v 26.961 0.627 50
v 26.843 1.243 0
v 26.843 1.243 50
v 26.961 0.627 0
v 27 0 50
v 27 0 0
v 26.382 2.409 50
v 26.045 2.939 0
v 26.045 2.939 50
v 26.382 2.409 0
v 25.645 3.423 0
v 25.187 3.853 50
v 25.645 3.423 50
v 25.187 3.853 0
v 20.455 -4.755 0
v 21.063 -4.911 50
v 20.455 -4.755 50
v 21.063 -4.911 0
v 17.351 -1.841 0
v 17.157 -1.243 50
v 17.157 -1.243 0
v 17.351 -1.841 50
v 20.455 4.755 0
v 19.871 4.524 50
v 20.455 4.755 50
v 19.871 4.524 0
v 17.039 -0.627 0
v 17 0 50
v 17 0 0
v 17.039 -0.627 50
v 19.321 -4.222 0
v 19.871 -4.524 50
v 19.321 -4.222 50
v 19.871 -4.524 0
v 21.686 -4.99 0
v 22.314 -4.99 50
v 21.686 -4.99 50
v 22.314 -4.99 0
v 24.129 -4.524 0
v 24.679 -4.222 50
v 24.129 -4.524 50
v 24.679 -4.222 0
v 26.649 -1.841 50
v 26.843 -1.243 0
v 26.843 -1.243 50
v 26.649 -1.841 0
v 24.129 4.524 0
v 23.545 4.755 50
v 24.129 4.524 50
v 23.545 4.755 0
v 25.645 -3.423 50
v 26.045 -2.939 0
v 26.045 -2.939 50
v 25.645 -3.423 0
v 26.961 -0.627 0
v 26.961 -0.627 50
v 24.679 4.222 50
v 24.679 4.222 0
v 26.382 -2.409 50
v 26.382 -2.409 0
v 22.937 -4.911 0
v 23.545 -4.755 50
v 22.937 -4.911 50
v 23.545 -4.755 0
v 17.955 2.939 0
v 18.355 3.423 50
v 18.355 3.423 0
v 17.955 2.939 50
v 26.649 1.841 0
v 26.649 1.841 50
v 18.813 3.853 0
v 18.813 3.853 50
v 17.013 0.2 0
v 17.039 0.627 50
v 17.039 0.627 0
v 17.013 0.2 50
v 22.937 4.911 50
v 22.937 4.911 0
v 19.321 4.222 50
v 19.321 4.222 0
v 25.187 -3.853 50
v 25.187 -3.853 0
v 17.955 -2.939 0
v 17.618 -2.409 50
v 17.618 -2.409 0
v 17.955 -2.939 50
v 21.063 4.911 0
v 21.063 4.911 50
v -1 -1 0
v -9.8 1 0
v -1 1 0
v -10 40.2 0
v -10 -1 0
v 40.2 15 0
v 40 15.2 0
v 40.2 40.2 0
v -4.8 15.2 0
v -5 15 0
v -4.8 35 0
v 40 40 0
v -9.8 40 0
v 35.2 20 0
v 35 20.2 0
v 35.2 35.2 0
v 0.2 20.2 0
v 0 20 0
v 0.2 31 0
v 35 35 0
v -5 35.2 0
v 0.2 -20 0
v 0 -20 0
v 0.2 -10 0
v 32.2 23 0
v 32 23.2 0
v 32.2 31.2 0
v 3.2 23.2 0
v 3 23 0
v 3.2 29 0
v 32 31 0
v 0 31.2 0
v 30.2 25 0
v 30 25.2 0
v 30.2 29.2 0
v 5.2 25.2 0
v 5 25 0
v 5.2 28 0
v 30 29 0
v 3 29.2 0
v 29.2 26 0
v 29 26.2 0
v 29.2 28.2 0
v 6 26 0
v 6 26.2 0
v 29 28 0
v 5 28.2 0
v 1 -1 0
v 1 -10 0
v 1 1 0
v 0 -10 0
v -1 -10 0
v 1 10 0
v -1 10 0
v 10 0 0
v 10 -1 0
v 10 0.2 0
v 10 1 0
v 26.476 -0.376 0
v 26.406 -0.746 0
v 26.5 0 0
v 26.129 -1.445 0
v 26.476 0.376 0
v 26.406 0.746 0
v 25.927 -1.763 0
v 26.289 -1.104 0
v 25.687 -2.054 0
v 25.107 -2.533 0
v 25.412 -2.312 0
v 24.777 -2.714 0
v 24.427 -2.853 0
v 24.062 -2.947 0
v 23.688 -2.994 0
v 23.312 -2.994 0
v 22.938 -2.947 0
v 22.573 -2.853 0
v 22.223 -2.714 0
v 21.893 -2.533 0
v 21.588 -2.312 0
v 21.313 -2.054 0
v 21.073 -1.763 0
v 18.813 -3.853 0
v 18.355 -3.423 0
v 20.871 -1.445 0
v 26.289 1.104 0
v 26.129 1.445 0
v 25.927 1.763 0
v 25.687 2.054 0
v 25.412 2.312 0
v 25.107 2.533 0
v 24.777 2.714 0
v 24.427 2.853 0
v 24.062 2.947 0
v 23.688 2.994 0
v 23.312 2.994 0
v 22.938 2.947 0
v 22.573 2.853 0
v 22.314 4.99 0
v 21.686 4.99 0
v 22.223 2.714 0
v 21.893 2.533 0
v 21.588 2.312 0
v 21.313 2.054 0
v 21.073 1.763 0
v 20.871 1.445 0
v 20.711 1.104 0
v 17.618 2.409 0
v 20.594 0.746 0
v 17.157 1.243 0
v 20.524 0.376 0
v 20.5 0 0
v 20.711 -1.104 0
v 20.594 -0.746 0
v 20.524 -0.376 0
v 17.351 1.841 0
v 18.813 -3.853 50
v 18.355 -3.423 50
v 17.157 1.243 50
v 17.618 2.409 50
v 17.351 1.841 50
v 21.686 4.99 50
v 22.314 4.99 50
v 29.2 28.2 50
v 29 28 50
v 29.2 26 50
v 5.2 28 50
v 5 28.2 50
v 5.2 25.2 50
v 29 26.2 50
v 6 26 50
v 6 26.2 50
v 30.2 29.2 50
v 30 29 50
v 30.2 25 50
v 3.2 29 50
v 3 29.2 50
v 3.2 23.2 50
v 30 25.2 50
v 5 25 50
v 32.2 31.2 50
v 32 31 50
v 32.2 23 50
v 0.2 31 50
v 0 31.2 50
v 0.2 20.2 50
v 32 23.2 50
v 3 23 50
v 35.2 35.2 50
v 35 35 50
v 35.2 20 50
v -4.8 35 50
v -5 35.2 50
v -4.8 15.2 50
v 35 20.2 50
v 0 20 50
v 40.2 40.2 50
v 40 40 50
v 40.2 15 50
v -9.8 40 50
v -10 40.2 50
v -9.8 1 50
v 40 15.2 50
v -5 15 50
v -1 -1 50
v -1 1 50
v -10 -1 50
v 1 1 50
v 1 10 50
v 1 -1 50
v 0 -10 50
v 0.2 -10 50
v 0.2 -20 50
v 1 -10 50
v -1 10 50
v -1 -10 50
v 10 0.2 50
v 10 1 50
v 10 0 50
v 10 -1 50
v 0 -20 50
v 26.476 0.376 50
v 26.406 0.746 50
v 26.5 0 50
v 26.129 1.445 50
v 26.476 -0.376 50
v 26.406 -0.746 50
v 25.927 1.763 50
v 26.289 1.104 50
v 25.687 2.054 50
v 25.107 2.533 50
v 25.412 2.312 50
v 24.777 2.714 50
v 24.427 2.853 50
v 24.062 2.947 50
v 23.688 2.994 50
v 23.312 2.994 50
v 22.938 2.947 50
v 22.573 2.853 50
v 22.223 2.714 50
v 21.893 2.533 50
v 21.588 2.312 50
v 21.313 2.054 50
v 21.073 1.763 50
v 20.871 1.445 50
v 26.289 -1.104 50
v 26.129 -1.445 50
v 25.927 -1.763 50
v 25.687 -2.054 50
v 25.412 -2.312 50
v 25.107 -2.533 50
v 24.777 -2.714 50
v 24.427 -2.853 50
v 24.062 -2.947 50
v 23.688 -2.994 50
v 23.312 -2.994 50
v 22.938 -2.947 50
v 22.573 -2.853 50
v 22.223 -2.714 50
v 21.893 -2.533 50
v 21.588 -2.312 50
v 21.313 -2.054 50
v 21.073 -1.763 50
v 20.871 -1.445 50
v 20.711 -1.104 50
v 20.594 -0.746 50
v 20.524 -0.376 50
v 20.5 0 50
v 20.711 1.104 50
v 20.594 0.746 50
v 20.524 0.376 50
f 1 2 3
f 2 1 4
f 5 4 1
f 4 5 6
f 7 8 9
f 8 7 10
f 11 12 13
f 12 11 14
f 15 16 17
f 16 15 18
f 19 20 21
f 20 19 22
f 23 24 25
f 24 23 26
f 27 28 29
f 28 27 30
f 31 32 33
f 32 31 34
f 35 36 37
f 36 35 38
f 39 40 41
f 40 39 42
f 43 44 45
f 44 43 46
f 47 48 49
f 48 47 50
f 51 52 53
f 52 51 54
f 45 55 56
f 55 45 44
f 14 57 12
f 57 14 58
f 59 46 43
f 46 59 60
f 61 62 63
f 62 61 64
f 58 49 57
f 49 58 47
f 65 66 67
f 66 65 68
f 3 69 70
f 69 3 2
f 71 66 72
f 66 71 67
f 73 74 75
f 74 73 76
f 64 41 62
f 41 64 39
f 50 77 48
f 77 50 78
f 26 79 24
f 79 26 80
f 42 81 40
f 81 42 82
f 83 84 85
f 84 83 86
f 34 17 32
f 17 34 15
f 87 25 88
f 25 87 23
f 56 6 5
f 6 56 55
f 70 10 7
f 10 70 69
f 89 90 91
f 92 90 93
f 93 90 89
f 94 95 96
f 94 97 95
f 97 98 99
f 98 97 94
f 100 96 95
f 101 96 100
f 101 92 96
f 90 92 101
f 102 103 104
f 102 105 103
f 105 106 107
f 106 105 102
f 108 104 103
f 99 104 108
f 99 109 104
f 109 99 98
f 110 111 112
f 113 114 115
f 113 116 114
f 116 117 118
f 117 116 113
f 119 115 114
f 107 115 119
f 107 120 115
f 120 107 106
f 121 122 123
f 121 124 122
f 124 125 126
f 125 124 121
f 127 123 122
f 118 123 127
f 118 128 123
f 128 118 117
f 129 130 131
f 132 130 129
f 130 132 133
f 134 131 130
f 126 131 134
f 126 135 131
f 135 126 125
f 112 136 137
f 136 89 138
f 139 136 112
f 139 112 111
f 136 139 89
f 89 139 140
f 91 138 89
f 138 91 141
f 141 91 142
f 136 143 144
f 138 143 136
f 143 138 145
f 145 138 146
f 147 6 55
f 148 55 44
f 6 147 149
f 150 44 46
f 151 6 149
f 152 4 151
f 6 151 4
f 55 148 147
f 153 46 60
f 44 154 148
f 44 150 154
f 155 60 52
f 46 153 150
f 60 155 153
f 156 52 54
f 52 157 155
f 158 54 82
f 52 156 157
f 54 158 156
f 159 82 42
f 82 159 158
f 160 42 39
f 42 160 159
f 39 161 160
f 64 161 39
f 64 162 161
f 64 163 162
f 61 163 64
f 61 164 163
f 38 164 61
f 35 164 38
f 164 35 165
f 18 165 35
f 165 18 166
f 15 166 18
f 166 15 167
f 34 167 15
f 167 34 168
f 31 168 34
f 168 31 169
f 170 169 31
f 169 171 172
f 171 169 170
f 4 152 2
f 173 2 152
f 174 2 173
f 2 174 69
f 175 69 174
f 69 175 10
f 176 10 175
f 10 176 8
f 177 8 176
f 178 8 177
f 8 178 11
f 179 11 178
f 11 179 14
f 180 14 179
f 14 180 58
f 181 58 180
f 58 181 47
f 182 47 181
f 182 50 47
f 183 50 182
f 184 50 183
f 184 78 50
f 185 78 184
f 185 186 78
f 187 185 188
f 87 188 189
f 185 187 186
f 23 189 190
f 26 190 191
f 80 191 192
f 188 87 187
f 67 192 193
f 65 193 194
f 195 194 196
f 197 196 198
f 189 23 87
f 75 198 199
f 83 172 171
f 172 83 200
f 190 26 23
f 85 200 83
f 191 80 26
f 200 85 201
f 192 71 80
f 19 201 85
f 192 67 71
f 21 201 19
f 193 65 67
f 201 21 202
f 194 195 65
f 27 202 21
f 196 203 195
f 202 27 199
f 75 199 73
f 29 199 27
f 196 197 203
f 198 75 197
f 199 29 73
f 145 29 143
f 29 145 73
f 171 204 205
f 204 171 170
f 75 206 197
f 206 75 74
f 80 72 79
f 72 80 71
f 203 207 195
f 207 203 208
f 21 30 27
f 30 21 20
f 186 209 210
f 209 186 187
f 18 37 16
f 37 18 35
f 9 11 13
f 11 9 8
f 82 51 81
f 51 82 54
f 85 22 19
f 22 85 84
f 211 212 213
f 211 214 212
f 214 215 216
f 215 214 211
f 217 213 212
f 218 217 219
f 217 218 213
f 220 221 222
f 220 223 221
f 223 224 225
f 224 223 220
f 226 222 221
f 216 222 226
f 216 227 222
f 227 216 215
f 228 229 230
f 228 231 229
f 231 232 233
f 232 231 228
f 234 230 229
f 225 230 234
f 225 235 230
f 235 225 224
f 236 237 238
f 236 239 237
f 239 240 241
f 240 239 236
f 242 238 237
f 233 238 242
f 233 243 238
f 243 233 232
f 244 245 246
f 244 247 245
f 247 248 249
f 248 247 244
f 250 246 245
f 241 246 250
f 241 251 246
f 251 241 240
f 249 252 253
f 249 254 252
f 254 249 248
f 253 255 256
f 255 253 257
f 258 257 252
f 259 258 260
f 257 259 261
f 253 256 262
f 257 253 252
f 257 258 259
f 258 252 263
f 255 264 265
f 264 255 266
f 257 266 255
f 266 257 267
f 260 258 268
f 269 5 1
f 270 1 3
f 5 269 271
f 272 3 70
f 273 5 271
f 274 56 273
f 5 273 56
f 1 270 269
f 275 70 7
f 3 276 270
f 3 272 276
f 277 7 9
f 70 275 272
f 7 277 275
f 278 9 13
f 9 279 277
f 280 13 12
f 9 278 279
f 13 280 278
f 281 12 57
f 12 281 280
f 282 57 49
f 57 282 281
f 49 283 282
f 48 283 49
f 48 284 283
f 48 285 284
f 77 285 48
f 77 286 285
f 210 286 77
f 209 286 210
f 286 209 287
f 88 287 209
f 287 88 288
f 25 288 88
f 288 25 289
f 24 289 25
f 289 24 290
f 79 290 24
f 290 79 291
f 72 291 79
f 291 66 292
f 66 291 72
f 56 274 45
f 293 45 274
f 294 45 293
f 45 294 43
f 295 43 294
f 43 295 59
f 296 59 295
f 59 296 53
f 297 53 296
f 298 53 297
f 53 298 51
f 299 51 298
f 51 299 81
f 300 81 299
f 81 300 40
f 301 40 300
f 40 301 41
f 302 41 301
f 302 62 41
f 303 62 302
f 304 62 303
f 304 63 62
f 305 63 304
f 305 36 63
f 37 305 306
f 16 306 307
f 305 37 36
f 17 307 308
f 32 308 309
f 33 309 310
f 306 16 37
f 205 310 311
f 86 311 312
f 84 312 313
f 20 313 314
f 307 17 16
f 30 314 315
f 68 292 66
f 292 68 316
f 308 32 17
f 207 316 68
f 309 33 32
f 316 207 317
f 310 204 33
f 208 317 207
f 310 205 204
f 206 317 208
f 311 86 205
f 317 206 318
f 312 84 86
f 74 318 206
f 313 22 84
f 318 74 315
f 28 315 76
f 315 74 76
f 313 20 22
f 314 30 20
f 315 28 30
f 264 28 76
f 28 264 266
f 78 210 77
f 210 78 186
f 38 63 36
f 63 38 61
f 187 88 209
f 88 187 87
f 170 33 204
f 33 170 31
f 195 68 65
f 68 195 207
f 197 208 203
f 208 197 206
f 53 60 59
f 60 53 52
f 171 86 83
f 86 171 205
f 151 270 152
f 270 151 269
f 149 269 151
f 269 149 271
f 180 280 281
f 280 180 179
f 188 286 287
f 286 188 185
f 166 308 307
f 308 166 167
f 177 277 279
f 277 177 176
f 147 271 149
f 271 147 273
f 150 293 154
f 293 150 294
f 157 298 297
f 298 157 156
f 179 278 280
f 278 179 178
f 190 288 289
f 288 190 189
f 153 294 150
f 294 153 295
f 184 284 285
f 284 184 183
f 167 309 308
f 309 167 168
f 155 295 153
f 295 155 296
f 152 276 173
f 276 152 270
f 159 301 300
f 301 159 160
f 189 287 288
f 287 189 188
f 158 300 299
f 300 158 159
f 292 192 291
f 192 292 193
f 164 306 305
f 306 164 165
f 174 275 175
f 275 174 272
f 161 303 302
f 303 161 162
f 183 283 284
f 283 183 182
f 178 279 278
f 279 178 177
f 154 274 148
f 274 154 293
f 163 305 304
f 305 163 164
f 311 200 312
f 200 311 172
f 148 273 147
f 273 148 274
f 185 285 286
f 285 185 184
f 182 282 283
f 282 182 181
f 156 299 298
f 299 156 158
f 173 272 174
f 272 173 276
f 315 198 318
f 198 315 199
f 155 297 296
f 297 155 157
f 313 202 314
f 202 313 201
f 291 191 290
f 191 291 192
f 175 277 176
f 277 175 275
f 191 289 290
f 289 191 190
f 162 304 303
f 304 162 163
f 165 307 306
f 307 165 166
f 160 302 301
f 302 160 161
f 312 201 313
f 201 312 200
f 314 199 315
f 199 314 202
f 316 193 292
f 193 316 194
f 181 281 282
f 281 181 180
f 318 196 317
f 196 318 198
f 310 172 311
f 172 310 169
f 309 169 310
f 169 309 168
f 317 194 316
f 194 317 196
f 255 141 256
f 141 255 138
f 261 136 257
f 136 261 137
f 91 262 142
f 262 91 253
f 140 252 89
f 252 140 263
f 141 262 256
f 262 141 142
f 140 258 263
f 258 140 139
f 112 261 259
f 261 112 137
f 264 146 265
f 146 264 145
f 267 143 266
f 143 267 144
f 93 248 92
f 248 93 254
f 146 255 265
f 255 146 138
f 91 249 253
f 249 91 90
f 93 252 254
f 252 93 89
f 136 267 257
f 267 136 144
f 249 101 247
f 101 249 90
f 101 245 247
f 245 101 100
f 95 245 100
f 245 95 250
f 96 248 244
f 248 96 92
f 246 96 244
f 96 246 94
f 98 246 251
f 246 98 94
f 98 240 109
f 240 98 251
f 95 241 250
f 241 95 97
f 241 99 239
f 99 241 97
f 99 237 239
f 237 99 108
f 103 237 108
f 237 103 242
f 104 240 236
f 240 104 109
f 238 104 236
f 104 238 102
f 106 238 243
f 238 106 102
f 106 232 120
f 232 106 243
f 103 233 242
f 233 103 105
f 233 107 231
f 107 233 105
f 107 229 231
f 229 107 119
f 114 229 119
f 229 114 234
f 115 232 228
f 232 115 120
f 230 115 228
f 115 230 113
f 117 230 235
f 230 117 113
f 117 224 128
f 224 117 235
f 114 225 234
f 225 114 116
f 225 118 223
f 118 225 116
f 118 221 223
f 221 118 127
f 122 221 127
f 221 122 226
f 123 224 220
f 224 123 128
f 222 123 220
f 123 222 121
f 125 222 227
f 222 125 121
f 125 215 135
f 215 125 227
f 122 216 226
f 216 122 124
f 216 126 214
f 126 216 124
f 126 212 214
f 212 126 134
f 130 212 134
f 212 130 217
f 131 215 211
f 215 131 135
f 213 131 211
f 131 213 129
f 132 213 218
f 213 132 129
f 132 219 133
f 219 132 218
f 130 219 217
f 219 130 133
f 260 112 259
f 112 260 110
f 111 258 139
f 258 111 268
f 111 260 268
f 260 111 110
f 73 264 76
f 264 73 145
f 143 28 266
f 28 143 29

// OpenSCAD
union() {

//central cube
translate([-1,-10,0]) cube([2,20,50]);
translate([-10,-1,0]) cube([20,2,50]);

// maze
translate([-10,0,0]) cube([0.2, 40, 50]);
translate([-10,40,0]) cube([50, 0.2, 50]);
translate([40,15,0]) cube([0.2, 25.2, 50]);
translate([-5,15,0]) cube([45, 0.2, 50]);
translate([-5,15,0]) cube([0.2, 20, 50]);
translate([-5,35,0]) cube([40, 0.2, 50]);
translate([35,20,0]) cube([0.2, 15.2, 50]);
translate([0,20,0]) cube([35, 0.2, 50]);

// 3
translate([0,20,0]) cube([0.2, 11,  50]);
translate([0,31,0]) cube([32, 0.2,  50]);
translate([32,23,0]) cube([0.2, 8.2,  50]);
translate([3,23,0]) cube([29, 0.2,  50]);

// 2
translate([3,23,0]) cube([0.2, 6,  50]);
translate([3,29,0]) cube([27, 0.2,  50]);
translate([30,25,0]) cube([0.2, 4.2,  50]);
translate([5,25,0]) cube([25, 0.2,  50]);

// 1
translate([5,25,0]) cube([0.2, 3,  50]);
translate([5,28,0]) cube([24, 0.2,  50]);
translate([29,26,0]) cube([0.2, 2.2, 50]);
translate([6,26,0]) cube([23, 0.2, 50]);

translate([0,-20,0]) cube([0.2, 10, 50]);
//translate([0,-39,0]) rotate(a=[0,0,90.5]) spiral();

translate([10,0,0]) cube([10, 0.2, 50]);

// cylinder
difference() {
	translate([22, 0, 0]) cylinder(r=5, h=50, $fn=50);
	translate([23.5, 0, 0]) cylinder(r=3, h=50, $fn=50);
}

}


// hmm, this is gunna be fun
module spiral(middle_x = 0, middle_y = 0, middle_z = 0, start=20, end=3, height=50, per_rot=2, res=2, width=0.2) {

// each rotation
for(i=[end:per_rot:start]) {
	for(k=[0:res:360]) {
		echo("i am ", i, " and ", k);
		translate([middle_x+cos(k)*(i-(k/360*per_rot)), middle_y+sin(k)*(i-(k/360*per_rot)), height/2]) rotate(a=[0,0,k*1.01]) cube([0.2, 1.05*(i-(k/360*per_rot))*sin(res),50], center=true);
	}
}

}
